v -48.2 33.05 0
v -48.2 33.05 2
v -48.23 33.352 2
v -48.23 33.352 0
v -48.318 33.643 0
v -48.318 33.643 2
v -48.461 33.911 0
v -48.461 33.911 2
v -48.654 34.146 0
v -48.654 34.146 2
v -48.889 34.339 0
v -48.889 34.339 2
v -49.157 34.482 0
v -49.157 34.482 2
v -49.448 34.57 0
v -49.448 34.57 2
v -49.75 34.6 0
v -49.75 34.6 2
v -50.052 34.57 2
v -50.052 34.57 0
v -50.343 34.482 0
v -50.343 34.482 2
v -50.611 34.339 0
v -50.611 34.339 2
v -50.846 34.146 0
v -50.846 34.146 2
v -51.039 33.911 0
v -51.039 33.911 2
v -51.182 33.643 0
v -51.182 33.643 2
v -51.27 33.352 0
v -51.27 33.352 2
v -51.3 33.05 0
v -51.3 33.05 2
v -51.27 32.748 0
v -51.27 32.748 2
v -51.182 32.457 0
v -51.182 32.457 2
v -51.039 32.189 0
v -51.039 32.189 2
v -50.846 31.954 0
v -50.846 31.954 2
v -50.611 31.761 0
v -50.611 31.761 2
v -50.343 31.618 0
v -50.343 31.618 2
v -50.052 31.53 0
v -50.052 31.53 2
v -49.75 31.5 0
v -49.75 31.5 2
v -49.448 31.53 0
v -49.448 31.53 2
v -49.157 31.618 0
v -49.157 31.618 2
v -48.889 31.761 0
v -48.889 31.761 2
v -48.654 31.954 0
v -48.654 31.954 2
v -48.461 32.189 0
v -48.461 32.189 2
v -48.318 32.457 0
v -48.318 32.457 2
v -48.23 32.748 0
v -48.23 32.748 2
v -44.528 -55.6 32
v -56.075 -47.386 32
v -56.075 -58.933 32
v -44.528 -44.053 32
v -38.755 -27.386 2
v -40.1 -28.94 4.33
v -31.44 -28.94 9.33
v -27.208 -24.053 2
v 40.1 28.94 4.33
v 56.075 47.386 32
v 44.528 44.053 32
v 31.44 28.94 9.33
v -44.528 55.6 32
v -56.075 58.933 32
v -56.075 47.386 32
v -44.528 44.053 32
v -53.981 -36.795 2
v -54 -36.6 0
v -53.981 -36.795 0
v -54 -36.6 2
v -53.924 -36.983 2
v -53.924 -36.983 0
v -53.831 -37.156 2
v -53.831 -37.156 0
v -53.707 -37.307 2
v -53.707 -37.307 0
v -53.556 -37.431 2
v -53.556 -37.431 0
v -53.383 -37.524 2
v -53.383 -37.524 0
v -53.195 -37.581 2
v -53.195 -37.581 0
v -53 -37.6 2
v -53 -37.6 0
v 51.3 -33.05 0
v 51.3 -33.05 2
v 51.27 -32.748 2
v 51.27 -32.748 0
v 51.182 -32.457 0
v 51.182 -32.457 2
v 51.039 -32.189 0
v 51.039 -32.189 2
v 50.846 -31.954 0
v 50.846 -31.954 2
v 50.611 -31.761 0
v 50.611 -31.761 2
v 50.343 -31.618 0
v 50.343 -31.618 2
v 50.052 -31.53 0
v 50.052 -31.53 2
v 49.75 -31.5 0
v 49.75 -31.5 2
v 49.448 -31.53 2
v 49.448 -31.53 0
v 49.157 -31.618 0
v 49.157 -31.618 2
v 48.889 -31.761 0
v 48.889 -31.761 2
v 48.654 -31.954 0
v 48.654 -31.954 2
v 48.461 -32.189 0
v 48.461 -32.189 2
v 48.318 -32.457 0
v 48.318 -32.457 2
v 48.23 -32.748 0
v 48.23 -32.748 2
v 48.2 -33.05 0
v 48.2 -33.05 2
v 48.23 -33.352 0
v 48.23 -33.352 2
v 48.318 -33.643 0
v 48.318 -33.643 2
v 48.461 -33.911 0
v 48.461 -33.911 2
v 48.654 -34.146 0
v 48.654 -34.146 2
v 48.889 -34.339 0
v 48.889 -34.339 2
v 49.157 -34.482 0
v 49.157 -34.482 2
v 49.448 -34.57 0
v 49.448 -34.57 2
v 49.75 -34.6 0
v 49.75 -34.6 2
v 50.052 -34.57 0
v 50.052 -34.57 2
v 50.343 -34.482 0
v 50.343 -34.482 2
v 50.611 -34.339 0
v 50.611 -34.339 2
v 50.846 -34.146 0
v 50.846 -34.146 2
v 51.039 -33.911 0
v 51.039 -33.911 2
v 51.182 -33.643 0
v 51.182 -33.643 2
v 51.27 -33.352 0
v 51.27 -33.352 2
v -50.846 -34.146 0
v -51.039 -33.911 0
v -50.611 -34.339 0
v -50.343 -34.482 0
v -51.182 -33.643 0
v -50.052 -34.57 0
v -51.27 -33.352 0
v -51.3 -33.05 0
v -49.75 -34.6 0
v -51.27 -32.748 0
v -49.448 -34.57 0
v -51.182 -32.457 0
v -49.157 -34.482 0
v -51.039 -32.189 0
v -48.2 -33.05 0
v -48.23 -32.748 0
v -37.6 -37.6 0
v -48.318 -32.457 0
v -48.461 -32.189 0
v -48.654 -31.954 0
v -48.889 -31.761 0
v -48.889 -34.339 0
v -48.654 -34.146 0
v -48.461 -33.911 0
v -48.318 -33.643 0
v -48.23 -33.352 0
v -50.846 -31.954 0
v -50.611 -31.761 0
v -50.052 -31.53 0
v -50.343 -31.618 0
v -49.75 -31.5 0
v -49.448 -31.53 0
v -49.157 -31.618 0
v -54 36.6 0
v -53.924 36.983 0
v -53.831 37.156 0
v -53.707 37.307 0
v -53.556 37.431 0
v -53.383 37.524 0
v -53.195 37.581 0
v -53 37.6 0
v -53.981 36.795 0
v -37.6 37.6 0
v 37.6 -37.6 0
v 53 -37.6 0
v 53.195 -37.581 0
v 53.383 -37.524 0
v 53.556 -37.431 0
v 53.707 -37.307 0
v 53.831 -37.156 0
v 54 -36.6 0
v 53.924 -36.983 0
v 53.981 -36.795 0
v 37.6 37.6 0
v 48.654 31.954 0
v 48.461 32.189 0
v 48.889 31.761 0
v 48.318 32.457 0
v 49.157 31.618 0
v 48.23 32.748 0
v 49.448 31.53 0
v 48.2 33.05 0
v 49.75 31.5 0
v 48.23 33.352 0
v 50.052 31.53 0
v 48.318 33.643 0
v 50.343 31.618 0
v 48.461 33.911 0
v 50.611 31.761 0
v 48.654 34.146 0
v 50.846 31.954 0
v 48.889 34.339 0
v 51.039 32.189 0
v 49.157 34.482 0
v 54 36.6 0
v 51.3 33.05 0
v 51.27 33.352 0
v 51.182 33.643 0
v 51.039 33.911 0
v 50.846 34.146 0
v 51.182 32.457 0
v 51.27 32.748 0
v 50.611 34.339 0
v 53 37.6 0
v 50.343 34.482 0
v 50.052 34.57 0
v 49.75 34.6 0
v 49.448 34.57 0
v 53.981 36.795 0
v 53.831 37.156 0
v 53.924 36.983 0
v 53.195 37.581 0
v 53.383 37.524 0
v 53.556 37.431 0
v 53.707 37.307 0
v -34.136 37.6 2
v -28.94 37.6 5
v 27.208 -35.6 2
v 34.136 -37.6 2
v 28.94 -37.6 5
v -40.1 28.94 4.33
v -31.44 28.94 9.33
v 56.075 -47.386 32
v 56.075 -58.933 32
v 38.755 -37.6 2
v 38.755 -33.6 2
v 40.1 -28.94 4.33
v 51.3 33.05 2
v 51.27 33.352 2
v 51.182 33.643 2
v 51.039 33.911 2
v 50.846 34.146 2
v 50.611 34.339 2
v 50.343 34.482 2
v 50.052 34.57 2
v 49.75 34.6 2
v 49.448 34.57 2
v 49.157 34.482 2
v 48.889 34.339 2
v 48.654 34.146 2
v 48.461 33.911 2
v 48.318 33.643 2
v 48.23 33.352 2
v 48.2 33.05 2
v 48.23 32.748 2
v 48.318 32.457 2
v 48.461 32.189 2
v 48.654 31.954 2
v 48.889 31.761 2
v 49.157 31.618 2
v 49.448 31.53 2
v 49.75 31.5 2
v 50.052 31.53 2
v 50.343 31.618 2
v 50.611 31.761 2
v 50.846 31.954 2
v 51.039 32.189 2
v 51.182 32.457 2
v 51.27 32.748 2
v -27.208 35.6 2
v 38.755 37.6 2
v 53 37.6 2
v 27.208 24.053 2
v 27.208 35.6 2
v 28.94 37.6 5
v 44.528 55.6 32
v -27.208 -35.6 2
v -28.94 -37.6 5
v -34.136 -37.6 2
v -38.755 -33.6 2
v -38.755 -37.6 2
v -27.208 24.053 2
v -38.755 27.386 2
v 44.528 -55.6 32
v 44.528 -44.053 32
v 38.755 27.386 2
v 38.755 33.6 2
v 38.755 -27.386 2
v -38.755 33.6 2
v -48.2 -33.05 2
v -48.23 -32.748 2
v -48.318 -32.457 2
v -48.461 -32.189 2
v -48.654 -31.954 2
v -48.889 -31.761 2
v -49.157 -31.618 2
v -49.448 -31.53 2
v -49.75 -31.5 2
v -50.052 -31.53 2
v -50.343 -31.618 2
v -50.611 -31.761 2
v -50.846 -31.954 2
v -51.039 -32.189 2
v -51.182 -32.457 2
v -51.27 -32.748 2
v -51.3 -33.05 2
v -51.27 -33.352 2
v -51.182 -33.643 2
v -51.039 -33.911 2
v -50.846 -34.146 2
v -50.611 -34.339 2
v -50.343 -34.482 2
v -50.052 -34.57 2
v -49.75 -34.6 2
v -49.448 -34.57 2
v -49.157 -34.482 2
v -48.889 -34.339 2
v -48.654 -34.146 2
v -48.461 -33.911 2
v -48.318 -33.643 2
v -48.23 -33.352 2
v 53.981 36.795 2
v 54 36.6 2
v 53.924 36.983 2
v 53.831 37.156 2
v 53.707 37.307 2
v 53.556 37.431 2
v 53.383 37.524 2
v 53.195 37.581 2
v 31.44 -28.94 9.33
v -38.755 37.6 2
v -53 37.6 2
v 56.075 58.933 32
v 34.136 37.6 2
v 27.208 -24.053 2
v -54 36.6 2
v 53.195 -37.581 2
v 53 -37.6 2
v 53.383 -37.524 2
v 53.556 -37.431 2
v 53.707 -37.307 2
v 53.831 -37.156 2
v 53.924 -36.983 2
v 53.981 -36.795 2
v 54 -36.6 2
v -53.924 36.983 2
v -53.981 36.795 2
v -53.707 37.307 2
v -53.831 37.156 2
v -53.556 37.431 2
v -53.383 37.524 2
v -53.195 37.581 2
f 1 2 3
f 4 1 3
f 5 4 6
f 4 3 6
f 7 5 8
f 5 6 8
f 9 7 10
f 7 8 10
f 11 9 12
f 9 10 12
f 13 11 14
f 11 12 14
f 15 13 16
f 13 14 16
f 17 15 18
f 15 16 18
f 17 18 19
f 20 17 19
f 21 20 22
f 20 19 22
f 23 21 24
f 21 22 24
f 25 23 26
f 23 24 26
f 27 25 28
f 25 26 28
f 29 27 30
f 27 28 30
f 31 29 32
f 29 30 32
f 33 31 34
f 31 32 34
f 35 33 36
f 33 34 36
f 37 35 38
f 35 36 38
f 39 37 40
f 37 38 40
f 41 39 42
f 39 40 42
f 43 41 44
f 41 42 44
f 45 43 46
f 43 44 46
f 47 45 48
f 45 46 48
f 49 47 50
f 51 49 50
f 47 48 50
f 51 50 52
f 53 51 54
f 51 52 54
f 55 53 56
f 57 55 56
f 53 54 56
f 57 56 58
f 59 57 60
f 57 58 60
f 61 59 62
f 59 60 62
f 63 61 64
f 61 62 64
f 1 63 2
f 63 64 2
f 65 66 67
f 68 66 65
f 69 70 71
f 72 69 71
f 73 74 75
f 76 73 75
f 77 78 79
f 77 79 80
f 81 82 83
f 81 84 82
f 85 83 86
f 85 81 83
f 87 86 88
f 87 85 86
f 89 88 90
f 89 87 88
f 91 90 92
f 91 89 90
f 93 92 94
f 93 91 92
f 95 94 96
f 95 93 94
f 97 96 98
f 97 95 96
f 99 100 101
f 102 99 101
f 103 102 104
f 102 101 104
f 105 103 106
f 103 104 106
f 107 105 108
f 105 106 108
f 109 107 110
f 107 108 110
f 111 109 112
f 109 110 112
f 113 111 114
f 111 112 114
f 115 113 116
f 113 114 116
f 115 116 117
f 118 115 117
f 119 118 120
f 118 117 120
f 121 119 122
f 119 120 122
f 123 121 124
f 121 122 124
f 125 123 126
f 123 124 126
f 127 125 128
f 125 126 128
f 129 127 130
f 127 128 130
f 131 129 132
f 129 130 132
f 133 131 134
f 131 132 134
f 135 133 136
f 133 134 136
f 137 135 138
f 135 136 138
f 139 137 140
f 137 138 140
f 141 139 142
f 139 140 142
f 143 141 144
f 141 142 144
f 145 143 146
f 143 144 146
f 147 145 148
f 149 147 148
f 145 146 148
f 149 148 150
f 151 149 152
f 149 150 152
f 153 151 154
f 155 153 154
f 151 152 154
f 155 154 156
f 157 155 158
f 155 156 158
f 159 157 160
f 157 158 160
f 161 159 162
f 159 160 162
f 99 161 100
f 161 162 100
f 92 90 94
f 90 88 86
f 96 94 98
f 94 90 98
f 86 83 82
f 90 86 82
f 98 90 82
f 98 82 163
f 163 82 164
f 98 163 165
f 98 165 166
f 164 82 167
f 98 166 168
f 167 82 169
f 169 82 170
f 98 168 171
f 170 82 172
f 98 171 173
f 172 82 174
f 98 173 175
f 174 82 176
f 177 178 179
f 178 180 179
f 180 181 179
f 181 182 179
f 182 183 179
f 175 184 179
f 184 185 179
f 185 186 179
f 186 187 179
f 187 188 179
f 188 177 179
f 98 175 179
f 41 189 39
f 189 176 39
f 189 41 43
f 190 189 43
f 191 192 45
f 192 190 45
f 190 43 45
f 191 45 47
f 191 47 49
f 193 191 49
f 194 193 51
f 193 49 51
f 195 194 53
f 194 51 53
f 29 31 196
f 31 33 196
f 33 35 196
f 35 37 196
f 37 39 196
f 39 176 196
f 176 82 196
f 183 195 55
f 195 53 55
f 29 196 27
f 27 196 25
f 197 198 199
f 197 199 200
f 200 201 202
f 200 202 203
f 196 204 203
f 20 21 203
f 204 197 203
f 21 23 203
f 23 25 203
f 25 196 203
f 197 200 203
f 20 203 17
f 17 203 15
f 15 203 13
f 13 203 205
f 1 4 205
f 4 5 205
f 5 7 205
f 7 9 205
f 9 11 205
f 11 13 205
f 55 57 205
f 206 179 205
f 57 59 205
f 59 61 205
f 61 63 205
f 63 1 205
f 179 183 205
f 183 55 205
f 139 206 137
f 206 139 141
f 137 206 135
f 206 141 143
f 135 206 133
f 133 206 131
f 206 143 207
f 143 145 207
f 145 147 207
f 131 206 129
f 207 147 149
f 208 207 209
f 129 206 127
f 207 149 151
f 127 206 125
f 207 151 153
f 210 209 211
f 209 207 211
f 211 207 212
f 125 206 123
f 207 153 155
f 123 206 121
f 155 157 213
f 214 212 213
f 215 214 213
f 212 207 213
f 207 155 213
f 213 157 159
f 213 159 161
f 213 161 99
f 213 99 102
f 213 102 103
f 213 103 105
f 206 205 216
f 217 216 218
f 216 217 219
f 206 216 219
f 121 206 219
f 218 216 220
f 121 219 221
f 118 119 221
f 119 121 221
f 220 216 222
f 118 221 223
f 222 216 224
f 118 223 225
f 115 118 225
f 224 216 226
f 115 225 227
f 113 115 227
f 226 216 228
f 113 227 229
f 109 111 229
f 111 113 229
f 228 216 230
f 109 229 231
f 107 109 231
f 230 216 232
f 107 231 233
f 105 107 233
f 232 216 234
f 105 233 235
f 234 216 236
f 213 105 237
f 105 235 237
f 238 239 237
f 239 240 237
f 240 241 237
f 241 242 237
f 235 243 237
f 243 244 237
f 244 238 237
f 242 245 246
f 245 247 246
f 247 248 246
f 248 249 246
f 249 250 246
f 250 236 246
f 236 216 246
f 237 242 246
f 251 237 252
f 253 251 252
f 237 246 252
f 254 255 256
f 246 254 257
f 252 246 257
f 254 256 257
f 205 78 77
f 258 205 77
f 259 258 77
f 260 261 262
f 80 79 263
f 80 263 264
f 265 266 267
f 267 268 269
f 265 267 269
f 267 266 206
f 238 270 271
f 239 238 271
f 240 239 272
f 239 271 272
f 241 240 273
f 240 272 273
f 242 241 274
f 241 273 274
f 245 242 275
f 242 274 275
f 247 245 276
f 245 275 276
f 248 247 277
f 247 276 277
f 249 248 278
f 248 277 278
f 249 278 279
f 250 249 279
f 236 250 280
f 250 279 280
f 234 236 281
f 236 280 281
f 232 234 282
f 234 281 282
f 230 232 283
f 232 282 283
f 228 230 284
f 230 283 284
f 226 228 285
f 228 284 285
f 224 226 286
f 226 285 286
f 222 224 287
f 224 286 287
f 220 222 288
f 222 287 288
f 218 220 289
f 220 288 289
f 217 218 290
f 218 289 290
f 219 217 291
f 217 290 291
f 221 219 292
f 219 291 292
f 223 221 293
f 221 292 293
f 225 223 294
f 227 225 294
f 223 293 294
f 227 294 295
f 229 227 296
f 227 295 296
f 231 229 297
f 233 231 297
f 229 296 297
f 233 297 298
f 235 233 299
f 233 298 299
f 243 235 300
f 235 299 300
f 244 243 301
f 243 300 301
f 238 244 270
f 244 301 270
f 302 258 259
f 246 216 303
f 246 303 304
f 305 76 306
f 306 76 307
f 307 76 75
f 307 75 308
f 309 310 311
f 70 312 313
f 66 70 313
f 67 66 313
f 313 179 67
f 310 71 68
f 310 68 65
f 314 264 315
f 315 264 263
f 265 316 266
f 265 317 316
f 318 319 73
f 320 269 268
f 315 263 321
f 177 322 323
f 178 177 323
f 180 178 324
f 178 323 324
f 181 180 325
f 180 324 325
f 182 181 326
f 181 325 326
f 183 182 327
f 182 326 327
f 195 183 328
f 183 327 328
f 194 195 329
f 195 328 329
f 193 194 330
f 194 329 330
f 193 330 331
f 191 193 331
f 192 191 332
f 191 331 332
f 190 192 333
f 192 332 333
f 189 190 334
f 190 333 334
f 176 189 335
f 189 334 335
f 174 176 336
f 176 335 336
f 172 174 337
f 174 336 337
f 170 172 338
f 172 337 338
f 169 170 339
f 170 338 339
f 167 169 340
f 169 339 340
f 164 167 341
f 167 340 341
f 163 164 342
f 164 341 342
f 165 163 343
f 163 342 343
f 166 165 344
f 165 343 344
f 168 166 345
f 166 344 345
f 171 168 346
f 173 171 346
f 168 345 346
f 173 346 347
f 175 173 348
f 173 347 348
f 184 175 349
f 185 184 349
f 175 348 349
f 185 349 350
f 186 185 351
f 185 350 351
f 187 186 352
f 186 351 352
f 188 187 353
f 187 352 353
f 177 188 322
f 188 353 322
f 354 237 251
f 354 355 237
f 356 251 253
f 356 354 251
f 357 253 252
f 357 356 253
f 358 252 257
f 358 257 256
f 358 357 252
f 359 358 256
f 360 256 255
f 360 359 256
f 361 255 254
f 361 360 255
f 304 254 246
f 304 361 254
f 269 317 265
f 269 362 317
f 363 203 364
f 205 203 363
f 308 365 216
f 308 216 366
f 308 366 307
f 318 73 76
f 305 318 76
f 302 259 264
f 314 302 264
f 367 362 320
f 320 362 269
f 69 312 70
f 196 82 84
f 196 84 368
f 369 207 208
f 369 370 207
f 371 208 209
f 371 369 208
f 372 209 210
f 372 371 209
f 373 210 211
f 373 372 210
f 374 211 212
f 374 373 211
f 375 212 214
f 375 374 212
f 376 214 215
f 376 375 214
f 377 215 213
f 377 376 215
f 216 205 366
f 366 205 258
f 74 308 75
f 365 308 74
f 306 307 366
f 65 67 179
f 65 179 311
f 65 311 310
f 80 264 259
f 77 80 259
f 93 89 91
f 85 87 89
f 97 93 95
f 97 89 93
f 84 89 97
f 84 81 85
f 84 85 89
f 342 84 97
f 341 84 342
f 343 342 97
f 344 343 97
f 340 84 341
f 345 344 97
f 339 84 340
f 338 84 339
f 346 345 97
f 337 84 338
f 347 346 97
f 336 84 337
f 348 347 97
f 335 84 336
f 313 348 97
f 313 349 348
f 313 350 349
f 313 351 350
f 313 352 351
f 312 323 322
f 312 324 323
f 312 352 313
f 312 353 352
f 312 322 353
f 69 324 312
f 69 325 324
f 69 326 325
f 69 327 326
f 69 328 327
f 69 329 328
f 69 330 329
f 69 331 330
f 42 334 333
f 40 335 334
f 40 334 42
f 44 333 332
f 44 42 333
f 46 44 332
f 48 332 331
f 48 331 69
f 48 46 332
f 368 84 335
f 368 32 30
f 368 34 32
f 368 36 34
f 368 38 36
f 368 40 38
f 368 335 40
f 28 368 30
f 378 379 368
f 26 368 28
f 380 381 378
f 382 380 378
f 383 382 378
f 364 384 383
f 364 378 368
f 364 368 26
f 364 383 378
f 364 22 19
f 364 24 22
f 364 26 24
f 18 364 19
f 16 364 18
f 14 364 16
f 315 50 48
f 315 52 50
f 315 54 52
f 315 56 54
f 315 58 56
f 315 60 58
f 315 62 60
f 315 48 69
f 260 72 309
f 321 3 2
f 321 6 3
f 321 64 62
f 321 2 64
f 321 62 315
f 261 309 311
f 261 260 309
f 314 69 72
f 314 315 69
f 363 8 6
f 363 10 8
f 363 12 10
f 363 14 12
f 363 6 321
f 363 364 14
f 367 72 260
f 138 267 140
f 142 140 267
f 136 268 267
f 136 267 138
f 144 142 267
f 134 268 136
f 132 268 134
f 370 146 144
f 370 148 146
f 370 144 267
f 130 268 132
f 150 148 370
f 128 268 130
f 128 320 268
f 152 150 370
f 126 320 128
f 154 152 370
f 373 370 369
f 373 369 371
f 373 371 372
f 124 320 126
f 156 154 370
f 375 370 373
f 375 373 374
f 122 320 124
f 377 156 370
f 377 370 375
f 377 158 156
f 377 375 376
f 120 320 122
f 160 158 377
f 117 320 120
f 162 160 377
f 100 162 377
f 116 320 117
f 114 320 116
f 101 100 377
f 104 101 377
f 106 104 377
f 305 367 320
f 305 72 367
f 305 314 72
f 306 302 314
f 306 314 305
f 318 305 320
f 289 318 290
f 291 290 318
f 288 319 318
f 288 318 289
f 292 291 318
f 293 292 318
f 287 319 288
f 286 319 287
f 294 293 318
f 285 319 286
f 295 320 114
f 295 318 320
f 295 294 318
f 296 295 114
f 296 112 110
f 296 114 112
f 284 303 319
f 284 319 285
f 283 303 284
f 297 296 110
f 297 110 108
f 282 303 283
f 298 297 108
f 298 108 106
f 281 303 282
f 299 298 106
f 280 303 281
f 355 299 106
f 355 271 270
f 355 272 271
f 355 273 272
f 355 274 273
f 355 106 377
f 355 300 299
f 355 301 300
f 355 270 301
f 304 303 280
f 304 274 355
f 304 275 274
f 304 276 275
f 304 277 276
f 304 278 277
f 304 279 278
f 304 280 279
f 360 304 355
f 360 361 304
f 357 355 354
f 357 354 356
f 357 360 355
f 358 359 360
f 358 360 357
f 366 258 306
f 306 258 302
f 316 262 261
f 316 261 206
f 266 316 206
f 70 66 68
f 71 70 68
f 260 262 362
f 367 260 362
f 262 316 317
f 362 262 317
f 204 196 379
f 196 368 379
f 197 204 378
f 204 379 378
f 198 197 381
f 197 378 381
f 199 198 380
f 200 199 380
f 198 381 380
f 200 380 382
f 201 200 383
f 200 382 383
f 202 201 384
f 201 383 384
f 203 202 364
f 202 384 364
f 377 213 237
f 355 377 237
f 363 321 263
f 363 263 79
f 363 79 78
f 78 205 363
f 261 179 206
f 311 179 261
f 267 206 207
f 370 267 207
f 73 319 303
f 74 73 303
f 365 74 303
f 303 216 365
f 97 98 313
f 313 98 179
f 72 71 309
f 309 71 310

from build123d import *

# Parameters (mm, degrees)
SKETCH_W     = 108
SKETCH_H     = 75.2
PAD_DEPTH    = 2
SKETCH001_R  = 1.55
POCKET_DEPTH = 2
SKETCH002_W  = 10
SKETCH002_H  = 10
PAD001_DEPTH = 60
PAD002_DEPTH = 10
PAD003_DEPTH = 10
PAD004_DEPTH = 10
SKETCH003_W  = 10
SKETCH003_H  = 10
PAD005_DEPTH = 60
PAD006_DEPTH = 10
FILLET_R     = 1
FILLET001_R  = 1
FILLET002_R  = 1
FILLET003_R  = 1
BOX_W        = 108
BOX_H        = 75.2
BOX_DEPTH    = 10
BOX001_W     = 216
BOX001_H     = 150.4
BOX001_DEPTH = 30


with BuildPart() as part:
    # Sketch → Pad (new body)
    with BuildSketch(Plane.XY):
        Rectangle(SKETCH_W, SKETCH_H)
    extrude(amount=PAD_DEPTH)

    # Sketch001 (on Face6 of Pad) → Pocket (cut)
    with BuildSketch(Plane.XY.offset(2)):
        with Locations((-49.75, 33.05)):
            Circle(SKETCH001_R)
        with Locations((49.75, 33.05)):
            Circle(SKETCH001_R)
        with Locations((49.75, -33.05)):
            Circle(SKETCH001_R)
        with Locations((-49.75, -33.05)):
            Circle(SKETCH001_R)
    extrude(amount=-POCKET_DEPTH, mode=Mode.SUBTRACT)

    # Sketch002 (on Face5 of Pocket) → Pad001 (join)
    with BuildSketch(Plane(origin=(-14.437445, 5.037445, 35.081278), x_dir=(0.866025, 0, 0.5), z_dir=(-0.433013, 0.5, 0.75))):
        with Locations((-32.6, 32.6)):
            Rectangle(SKETCH002_W, SKETCH002_H)
    pad001 = extrude(amount=PAD001_DEPTH)

    # Mirrored: Pad001 across YZ
    add(pad001.mirror(Plane.YZ))

    # Mirrored001: Pad001 across XZ
    add(pad001.mirror(Plane.XZ))

    # Mirrored001 Face22 → Pad002 (add)
    with BuildSketch(Plane(origin=(34.284733, 32.964866, 5.00416), x_dir=(-0.755929, 0.654654, 0), z_dir=(-0.433013, -0.5, -0.75))):
        Polygon((3.146916, 4.541863), (-2.963185, 4.541863), (-7.030988, 1.019042), (-0.484451, -6.540247), (7.074838, 0.006289), align=None)
    extrude(amount=PAD002_DEPTH)

    # Pad002 Face21 → Pad003 (add)
    with BuildSketch(Plane(origin=(-34.284733, 32.964866, 5.00416), x_dir=(-0.755929, -0.654654, 0), z_dir=(0.433013, -0.5, -0.75))):
        Polygon((2.963185, 4.541863), (-3.146916, 4.541863), (-7.074838, 0.006289), (0.484451, -6.540247), (7.030988, 1.019042), align=None)
    extrude(amount=PAD003_DEPTH)

    # Pad003 Face35 → Pad004 (add)
    with BuildSketch(Plane(origin=(-34.284733, -32.964866, 5.00416), x_dir=(0.755929, -0.654654, 0), z_dir=(0.433013, 0.5, -0.75))):
        Polygon((3.146916, 4.541863), (-2.963185, 4.541863), (-7.030988, 1.019042), (-0.484451, -6.540247), (7.074838, 0.006289), align=None)
    extrude(amount=PAD004_DEPTH)

    # Sketch003 (on Face4 of Pad004) → Pad005 (join)
    with BuildSketch(Plane(origin=(14.437445, -5.037445, 35.081278), x_dir=(0.866025, 0, -0.5), z_dir=(0.433013, -0.5, 0.75))):
        with Locations((32.6, -32.6)):
            Rectangle(SKETCH003_W, SKETCH003_H)
    extrude(amount=PAD005_DEPTH)

    # Pad005 Face44 → Pad006 (add)
    with BuildSketch(Plane(origin=(34.284733, -32.964866, 5.00416), x_dir=(0.755929, 0.654654, 0), z_dir=(-0.433013, 0.5, -0.75))):
        Polygon((-7.074838, 0.006289), (0.484451, -6.540247), (7.030988, 1.019042), (2.963185, 4.541863), (-3.146916, 4.541863), align=None)
    extrude(amount=PAD006_DEPTH)

    # Fillet
    fillet_edges = [part.edges().sort_by_distance(p)[0] for p in [
        (-54, -37.6, 1),
    ]]
    fillet(fillet_edges, radius=FILLET_R)

    # Fillet001
    fillet001_edges = [part.edges().sort_by_distance(p)[0] for p in [
        (-54, 37.6, 1),
    ]]
    fillet(fillet001_edges, radius=FILLET001_R)

    # Fillet002
    fillet002_edges = [part.edges().sort_by_distance(p)[0] for p in [
        (54, -37.6, 1),
    ]]
    fillet(fillet002_edges, radius=FILLET002_R)

    # Fillet003
    fillet003_edges = [part.edges().sort_by_distance(p)[0] for p in [
        (54, 37.6, 1),
    ]]
    fillet(fillet003_edges, radius=FILLET003_R)

    # Box → Box (cut)
    with BuildSketch(Plane(origin=(-54, 37.6, 0), x_dir=(1, 0, 0), z_dir=(0, 0, -1))):
        with Locations((54, 37.6)):
            Rectangle(BOX_W, BOX_H)
    extrude(amount=BOX_DEPTH, mode=Mode.SUBTRACT)

    # Box001 → Box001 (cut)
    with BuildSketch(Plane(origin=(-108, -75.2, 32), x_dir=(1, 0, 0), z_dir=(0, 0, 1))):
        with Locations((108, 75.2)):
            Rectangle(BOX001_W, BOX001_H)
    extrude(amount=BOX001_DEPTH, mode=Mode.SUBTRACT)


solid = part.part
